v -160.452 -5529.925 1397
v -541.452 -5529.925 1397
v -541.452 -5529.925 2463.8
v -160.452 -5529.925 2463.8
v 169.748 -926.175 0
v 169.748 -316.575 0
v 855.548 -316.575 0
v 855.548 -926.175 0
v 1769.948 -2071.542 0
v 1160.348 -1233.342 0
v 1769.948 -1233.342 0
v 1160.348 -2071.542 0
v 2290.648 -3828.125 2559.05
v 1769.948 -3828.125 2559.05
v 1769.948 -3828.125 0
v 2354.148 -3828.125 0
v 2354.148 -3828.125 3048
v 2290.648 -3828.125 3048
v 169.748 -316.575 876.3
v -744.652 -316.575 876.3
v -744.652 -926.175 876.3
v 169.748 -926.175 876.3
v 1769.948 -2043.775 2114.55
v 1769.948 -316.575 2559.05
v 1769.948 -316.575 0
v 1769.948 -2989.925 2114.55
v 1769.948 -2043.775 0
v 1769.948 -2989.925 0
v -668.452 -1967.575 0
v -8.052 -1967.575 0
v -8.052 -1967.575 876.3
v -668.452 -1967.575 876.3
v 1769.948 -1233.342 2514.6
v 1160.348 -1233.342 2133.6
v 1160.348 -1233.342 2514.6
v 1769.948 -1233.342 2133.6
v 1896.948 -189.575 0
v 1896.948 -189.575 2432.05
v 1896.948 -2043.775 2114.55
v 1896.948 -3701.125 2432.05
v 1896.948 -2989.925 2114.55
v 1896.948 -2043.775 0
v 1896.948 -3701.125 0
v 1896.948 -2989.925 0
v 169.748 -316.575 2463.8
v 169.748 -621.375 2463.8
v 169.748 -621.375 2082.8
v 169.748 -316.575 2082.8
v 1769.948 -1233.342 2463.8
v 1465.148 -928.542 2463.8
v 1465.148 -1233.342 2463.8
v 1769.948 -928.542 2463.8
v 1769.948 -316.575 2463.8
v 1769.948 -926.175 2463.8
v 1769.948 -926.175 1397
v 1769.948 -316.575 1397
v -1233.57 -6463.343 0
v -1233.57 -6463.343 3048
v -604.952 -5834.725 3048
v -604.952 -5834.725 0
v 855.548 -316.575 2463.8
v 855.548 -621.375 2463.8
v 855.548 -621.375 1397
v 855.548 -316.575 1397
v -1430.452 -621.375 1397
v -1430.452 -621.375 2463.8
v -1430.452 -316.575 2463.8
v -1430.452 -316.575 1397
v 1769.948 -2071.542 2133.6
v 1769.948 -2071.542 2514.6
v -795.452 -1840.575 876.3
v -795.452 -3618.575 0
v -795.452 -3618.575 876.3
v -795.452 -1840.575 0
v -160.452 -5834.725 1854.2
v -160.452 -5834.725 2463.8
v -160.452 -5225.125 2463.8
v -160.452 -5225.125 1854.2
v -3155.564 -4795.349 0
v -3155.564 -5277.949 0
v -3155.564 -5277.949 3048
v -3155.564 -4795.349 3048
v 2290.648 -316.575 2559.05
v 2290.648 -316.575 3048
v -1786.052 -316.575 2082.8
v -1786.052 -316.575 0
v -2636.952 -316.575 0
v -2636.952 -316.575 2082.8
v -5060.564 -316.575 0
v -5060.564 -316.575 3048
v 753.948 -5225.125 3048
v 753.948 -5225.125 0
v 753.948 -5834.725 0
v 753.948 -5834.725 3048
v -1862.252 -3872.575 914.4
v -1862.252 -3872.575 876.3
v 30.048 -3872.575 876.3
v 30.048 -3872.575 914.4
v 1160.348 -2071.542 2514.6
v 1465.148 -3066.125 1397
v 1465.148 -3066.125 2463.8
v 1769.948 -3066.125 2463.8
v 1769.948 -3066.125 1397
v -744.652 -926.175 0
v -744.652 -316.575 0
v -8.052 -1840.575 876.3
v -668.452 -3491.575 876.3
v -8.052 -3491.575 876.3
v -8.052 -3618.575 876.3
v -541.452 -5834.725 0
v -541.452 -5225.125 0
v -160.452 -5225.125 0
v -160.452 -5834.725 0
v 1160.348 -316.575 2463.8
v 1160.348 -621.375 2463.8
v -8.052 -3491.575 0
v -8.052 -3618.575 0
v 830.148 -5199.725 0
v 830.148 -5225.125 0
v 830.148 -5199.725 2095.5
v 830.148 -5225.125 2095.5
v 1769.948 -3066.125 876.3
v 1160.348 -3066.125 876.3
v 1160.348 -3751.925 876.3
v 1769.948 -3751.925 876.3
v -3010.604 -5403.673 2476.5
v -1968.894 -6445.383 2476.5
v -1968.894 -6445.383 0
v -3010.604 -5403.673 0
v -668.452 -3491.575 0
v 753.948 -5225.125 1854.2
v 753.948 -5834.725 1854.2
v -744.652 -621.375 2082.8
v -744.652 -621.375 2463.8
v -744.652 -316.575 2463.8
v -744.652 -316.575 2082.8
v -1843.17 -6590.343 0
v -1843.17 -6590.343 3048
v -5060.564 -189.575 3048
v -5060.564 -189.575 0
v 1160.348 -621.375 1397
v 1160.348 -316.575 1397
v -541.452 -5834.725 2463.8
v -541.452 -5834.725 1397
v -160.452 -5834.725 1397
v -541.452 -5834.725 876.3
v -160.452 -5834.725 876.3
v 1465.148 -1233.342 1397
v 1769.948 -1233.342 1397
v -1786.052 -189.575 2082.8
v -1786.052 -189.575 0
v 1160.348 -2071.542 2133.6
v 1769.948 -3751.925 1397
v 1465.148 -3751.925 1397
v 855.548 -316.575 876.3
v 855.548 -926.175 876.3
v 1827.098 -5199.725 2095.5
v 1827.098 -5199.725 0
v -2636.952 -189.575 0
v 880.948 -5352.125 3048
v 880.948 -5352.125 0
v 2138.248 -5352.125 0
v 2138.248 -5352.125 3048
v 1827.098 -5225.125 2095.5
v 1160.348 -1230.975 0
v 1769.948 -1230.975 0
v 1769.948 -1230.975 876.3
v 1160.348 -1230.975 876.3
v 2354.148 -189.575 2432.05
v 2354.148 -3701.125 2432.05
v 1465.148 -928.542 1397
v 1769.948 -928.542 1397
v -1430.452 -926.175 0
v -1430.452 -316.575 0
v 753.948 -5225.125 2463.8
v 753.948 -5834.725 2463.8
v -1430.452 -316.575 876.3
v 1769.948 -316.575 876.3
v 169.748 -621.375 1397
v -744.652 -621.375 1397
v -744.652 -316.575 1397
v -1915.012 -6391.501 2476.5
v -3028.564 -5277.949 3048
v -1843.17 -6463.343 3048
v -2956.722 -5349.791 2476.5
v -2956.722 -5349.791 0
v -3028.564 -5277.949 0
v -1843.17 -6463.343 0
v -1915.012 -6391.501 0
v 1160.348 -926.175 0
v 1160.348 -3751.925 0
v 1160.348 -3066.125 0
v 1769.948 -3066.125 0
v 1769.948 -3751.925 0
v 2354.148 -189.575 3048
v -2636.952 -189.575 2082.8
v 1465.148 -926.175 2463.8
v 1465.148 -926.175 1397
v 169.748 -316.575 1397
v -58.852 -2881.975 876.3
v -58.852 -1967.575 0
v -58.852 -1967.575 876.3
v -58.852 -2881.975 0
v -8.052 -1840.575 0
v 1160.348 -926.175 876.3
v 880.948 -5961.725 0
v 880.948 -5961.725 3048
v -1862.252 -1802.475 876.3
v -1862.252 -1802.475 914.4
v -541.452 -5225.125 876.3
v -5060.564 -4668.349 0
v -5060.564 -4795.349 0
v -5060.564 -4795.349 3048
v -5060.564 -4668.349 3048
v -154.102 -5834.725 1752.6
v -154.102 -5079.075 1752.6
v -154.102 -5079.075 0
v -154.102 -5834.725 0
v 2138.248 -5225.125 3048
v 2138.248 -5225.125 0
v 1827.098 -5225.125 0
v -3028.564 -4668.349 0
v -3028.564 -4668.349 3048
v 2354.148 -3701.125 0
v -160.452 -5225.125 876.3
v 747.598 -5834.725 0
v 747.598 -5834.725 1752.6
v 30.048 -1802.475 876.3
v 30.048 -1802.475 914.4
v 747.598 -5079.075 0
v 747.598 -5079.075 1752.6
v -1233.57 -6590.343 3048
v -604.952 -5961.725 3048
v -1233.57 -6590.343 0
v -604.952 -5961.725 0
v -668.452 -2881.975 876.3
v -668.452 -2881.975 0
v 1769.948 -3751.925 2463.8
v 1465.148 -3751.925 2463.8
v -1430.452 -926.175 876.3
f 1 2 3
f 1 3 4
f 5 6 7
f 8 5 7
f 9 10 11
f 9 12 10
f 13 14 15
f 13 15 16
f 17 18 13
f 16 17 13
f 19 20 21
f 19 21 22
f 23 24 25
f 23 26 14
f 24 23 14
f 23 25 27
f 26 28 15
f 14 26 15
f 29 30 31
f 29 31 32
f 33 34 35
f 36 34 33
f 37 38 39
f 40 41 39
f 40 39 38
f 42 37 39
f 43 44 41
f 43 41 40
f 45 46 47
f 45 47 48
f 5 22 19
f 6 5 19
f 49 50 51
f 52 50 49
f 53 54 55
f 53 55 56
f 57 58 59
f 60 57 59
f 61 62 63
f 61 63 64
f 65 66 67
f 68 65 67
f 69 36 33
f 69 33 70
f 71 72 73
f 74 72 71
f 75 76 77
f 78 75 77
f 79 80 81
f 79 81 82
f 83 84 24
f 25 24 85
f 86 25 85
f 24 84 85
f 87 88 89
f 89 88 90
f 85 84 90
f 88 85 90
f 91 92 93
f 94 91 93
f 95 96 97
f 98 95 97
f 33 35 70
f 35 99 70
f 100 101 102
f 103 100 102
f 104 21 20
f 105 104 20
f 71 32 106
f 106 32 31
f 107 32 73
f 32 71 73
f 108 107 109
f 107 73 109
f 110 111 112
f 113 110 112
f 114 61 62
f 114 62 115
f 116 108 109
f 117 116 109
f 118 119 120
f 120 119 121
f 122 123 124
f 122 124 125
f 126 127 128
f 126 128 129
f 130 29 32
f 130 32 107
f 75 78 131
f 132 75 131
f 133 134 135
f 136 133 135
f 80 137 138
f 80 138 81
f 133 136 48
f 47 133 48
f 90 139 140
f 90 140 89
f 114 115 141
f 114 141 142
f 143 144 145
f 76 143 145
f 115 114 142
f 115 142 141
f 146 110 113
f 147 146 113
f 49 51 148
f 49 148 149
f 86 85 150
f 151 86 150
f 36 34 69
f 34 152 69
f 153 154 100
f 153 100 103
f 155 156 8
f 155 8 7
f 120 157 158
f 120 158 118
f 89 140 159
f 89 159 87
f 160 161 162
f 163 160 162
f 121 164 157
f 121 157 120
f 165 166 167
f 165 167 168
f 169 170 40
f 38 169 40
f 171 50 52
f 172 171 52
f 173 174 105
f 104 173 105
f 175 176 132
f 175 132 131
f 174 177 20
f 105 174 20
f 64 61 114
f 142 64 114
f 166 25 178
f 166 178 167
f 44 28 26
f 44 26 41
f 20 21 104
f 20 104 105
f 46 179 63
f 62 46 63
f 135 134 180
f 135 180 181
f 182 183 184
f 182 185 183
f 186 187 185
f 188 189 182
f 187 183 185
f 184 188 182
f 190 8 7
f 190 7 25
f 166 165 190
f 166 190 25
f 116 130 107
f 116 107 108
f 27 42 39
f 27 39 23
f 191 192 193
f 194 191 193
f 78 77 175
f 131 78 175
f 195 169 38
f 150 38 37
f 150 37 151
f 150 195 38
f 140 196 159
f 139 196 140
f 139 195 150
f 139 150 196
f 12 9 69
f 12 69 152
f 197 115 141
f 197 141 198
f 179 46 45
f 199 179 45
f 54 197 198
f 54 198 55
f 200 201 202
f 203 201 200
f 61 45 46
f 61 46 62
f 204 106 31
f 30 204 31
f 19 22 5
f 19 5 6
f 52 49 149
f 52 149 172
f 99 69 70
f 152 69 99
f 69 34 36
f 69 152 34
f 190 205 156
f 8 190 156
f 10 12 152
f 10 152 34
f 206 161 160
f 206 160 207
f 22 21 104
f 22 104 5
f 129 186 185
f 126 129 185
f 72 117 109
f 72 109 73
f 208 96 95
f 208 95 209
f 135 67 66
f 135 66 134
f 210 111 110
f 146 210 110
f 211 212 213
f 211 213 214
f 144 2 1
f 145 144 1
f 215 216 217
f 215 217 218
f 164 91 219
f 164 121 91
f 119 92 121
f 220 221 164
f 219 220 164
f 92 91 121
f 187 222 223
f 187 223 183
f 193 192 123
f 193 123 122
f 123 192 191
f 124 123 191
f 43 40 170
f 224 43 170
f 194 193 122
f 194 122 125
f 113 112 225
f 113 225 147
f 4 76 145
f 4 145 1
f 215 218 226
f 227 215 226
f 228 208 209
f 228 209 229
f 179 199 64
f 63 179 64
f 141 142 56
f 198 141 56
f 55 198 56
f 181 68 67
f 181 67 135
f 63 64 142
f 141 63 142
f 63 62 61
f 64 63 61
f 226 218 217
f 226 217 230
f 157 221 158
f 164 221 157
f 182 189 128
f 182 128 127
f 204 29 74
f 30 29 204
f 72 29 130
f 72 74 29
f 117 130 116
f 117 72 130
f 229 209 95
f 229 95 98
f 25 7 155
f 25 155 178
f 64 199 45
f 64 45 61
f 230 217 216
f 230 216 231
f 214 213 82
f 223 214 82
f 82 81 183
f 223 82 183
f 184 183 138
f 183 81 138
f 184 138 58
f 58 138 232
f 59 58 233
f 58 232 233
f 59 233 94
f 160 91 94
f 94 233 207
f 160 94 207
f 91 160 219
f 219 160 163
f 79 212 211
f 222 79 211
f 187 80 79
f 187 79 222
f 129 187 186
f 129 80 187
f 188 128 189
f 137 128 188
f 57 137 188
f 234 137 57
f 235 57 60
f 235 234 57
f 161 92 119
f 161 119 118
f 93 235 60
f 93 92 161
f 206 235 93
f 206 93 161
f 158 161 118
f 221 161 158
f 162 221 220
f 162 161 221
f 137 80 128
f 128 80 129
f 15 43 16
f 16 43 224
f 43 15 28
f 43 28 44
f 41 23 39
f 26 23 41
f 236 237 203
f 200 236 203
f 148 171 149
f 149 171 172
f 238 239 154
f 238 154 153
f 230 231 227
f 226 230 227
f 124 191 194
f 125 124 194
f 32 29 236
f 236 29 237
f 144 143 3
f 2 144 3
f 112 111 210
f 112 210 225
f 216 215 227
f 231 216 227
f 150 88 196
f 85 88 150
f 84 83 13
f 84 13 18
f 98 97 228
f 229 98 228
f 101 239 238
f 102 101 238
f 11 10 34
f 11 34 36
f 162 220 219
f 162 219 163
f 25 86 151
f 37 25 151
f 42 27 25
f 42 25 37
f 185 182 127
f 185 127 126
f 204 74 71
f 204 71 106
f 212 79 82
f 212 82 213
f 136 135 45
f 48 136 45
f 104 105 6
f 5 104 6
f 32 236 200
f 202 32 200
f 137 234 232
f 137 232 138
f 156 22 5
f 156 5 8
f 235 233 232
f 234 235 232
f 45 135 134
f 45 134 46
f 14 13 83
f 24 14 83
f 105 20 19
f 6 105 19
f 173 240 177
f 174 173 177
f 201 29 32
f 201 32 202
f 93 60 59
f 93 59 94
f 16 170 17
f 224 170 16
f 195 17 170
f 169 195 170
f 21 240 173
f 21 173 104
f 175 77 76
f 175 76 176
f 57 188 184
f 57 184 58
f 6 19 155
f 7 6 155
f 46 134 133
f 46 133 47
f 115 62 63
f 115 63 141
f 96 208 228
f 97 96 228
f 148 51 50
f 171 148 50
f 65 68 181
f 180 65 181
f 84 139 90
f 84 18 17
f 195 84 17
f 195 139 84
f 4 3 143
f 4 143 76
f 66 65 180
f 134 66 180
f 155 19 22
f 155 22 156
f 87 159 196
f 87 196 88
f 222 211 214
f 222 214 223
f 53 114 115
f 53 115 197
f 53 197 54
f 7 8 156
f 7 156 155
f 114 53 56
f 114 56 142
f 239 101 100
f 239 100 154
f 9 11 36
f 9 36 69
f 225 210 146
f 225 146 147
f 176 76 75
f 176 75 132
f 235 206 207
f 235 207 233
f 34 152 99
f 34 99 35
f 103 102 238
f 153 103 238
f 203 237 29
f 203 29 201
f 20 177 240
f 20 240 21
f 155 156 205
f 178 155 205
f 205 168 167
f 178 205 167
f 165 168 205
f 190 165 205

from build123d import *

# Parameters (mm, degrees)
F0_W      = 3556
F0_H      = 127
F1_DEPTH  = 3048
F3_DEPTH  = 3048
F4_W      = 127
F4_H      = 838.2
F5_DEPTH  = 3048
F6_W      = 1016
F6_H      = 127
F7_DEPTH  = 3048
F8_W      = 127
F8_H      = 482.6
F9_DEPTH  = 3048
F10_W     = 368.3
F10_H     = 127
F11_DEPTH = 3048
F12_W     = 996.95
F12_H     = 2095.5
F13_DEPTH = 25.4
F14_W     = 850.9
F14_H     = 965.2
F15_DEPTH = 127
F16_W     = 127
F16_H     = 965.2
F16_H_2   = 2082.8
F17_DEPTH = 2423.611736456
F18_W     = 1059.5979121052
F18_H     = 933.45
F19_DEPTH = 127
F21_W     = 457.2
F21_H     = 127
F22_DEPTH = 3048
F24_W     = 520.7
F24_H     = 3638.55
F25_DEPTH = 127
F26_W     = 3699.2286321938
F26_H     = 1626.0209083557
F27_DEPTH = 1270
F29_DEPTH = 127
F30_W     = 63.5
F30_H     = 615.95
F31_DEPTH = 3511.55
F32_W     = 1473.2
F32_H     = 2476.5
F33_DEPTH = 76.2
F34_W     = 609.6
F34_H     = 685.8
F35_DEPTH = 876.3
F37_DEPTH = 876.3
F39_DEPTH = 2133.6
F41_W     = 304.8
F41_H     = 685.8
F42_DEPTH = 1066.8
F43_W     = 304.8
F43_H     = 304.8
F44_DEPTH = 1066.8
F46_DEPTH = 1066.8
F47_W     = 304.8
F47_H     = 304.8
F48_DEPTH = 1066.8
F49_W     = 685.8
F49_H     = 609.6
F50_DEPTH = 876.3
F51_W     = 914.4
F51_H     = 609.6
F52_DEPTH = 876.3
F53_W     = 685.8
F53_H     = 609.6
F54_DEPTH = 876.3
F55_W     = 685.8
F55_H     = 304.8
F56_DEPTH = 1066.8
F57_W     = 914.4
F57_H     = 304.8
F58_DEPTH = 381
F59_W     = 685.8
F59_H     = 304.8
F60_DEPTH = 1066.8
F61_DEPTH = 381
F62_W     = 609.6
F62_H     = 914.4
F63_DEPTH = 876.3
F65_DEPTH = 876.3
F67_W     = 1892.3
F67_H     = 2070.1
F68_DEPTH = 38.1
F69_W     = 901.7
F69_H     = 755.65
F70_DEPTH = 1752.6
F71_W     = 381
F71_H     = 609.6
F72_DEPTH = 876.3
F73_W     = 914.4
F73_H     = 609.6
F74_DEPTH = 609.6
F75_W     = 381
F75_H     = 304.8
F76_DEPTH = 1066.8


with BuildPart() as f1:
    # F0 (on Top) → F1 (new body)
    with BuildSketch(Plane.XY):
        with Locations((-8.052283898, -253.0751817405)):
            Rectangle(F0_W, F0_H)
    extrude(amount=F1_DEPTH)

    # F2 (on face) → F3 (join, through all)
    with BuildSketch(Plane(origin=(0, 0, 0), x_dir=(1, 0, 0), z_dir=(0, 0, -1))):
        Polygon((1769.947716102, 2043.7751817405), (1769.947716102, 316.5751817405), (1769.947716102, 189.5751817405), (1896.947716102, 189.5751817405), (1896.947716102, 2043.7751817405), align=None)
    extrude(amount=-F3_DEPTH)

    # F14 (on face) → F15 (join, through all)
    with BuildSketch(Plane.XZ.offset(316.5751817405)):
        with Locations((-2211.502283898, 2565.4)):
            Rectangle(F14_W, F14_H)
    extrude(amount=-F15_DEPTH)

    # F16 (on face) → F17 (join, through all)
    with BuildSketch(Plane(origin=(-2636.952283898, 0, 0), x_dir=(0, -1, 0), z_dir=(-1, 0, 0))):
        with Locations((253.0751817405, 2565.4)):
            Rectangle(F16_W, F16_H)
        with Locations((253.0751817405, 1041.4)):
            Rectangle(F16_W, F16_H_2)
    extrude(amount=F17_DEPTH)


with BuildPart() as f5:
    # F4 (on face) → F5 (new body, through all)
    with BuildSketch(Plane(origin=(0, 0, 0), x_dir=(1, 0, 0), z_dir=(0, 0, -1))):
        with Locations((1833.447716102, 3409.0251817405)):
            Rectangle(F4_W, F4_H)
    extrude(amount=-F5_DEPTH)


with BuildPart() as f7:
    # F6 (on face) → F7 (new body, through all)
    with BuildSketch(Plane(origin=(0, 0, 0), x_dir=(1, 0, 0), z_dir=(0, 0, -1))):
        with Locations((1261.947716102, 5288.6251817405)):
            Rectangle(F6_W, F6_H)
    extrude(amount=-F7_DEPTH)

    # F8 (on face) → F9 (join, through all)
    with BuildSketch(Plane(origin=(0, 0, 0), x_dir=(1, 0, 0), z_dir=(0, 0, -1))):
        Polygon((-3028.564020354, 5277.9493022342), (-1843.1702123728, 6463.3431102153), (-1843.1702123728, 6590.3431102153), (-3155.564020354, 5277.9493022342), (-3155.564020354, 4795.3493022342), (-5060.564020354, 4795.3493022342), (-5060.564020354, 4668.3493022342), (-3028.564020354, 4668.3493022342), align=None)
        Polygon((-1233.5702123728, 6463.3431102153), (-604.952283898, 5834.7251817405), (-604.952283898, 5961.7251817405), (-1233.5702123728, 6590.3431102153), (-1843.1702123728, 6590.3431102153), (-1843.1702123728, 6463.3431102153), align=None)
        Polygon((-604.952283898, 5834.7251817405), (753.947716102, 5834.7251817405), (880.947716102, 5834.7251817405), (880.947716102, 5961.7251817405), (-604.952283898, 5961.7251817405), align=None)
        with Locations((817.447716102, 5593.4251817405)):
            Rectangle(F8_W, F8_H)
    extrude(amount=-F9_DEPTH)

    # F10 (on face) → F11 (join, through all)
    with BuildSketch(Plane(origin=(0, 0, 0), x_dir=(1, 0, 0), z_dir=(0, 0, -1))):
        with Locations((1954.097716102, 5288.6251817405)):
            Rectangle(F10_W, F10_H)
    extrude(amount=-F11_DEPTH)

    # F12 (on face) → F13 (join)
    with BuildSketch(Plane(origin=(0, -5225.1251817405, 0), x_dir=(-1, 0, 0), z_dir=(0, 1, 0))):
        with Locations((-1328.622716102, 1047.75)):
            Rectangle(F12_W, F12_H)
    extrude(amount=F13_DEPTH)

    # F32 (on face) → F33 (cut)
    with BuildSketch(Plane(origin=(-4153.2566612941, -4153.2566612941, 0), x_dir=(-0.7071067812, 0.7071067812, 0), z_dir=(0.7071067812, 0.7071067812, 0))):
        with Locations((-2428.7555863187, 1238.25)):
            Rectangle(F32_W, F32_H)
    extrude(amount=-F33_DEPTH, mode=Mode.SUBTRACT)


with BuildPart() as f19:
    # F18 (on face) → F19 (new body, through all)
    with BuildSketch(Plane(origin=(1769.947716102, 0, 0), x_dir=(0, -1, 0), z_dir=(-1, 0, 0))):
        with Locations((2573.5741377931, 2581.275)):
            Rectangle(F18_W, F18_H)
    extrude(amount=-F19_DEPTH)


with BuildPart() as f1_1:
    add(f1.part)

    # F20: union F19, F5
    add(f19.part)
    add(f5.part)

    # F21 (on face) → F22 (join, through all)
    with BuildSketch(Plane.XY.offset(3048)):
        with Locations((2125.547716102, -3764.6251817405)):
            Rectangle(F21_W, F21_H)
    extrude(amount=-F22_DEPTH)

    # F24 (on offset) → F25 (join)
    with BuildSketch(Plane(origin=(0, 0, 2559.05), x_dir=(1, 0, 0), z_dir=(0, 0, -1))):
        with Locations((2030.297716102, 2008.8501817405)):
            Rectangle(F24_W, F24_H)
    extrude(amount=F25_DEPTH)

    # F26 (on face) → F27 (cut)
    with BuildSketch(Plane.YZ.offset(2290.647716102)):
        with Locations((-2166.1894978374, 3372.0604541779)):
            Rectangle(F26_W, F26_H)
    extrude(amount=-F27_DEPTH, mode=Mode.SUBTRACT)

    # F28 (on face) → F29 (join, through all)
    with BuildSketch(Plane(origin=(0, -189.5751817405, 0), x_dir=(-1, 0, 0), z_dir=(0, 1, 0))):
        Polygon((-1896.947716102, 2559.05), (-1896.947716102, 3048), (-2354.147716102, 3048), (-2354.147716102, 2432.05), (-2290.647716102, 2432.05), (-2290.647716102, 2559.05), align=None)
    extrude(amount=-F29_DEPTH)

    # F30 (on face) → F31 (join, through all)
    with BuildSketch(Plane(origin=(0, -189.5751817405, 0), x_dir=(-1, 0, 0), z_dir=(0, 1, 0))):
        with Locations((-2322.397716102, 2740.025)):
            Rectangle(F30_W, F30_H)
    extrude(amount=-F31_DEPTH)


with BuildPart() as f35:
    # F34 (on face) → F35 (new body)
    with BuildSketch(Plane(origin=(0, 0, 0), x_dir=(1, 0, 0), z_dir=(0, 0, -1))):
        with Locations((1465.147716102, 3409.0251817405)):
            Rectangle(F34_W, F34_H)
    extrude(amount=-F35_DEPTH)


with BuildPart() as f37:
    # F36 (on face) → F37 (new body, through all)
    with BuildSketch(Plane(origin=(0, 0, 0), x_dir=(1, 0, 0), z_dir=(0, 0, -1))):
        Polygon((855.547716102, 926.1751817405), (855.547716102, 316.5751817405), (1769.947716102, 316.5751817405), (1769.947716102, 1230.9751817405), (1160.347716102, 1230.9751817405), (1160.347716102, 926.1751817405), align=None)
    extrude(amount=-F37_DEPTH)


with BuildPart() as f39:
    # F38 (on face) → F39 (new body)
    with BuildSketch(Plane(origin=(0, 0, 0), x_dir=(1, 0, 0), z_dir=(0, 0, -1))):
        Polygon((1160.347716102, 1233.342051506), (1769.947716102, 1233.342051506), (1769.947716102, 2043.7751817405), (1769.947716102, 2071.542051506), (1160.347716102, 2071.542051506), align=None)
    extrude(amount=-F39_DEPTH)


with BuildPart() as f42:
    # F41 (on offset) → F42 (new body)
    with BuildSketch(Plane(origin=(0, 0, 1397), x_dir=(1, 0, 0), z_dir=(0, 0, -1))):
        with Locations((1617.547716102, 3409.0251817405)):
            Rectangle(F41_W, F41_H)
    extrude(amount=-F42_DEPTH)


with BuildPart() as f44:
    # F43 (on face) → F44 (new body, through all)
    with BuildSketch(Plane.XY.offset(2463.8)):
        with Locations((1617.547716102, -1080.942051506)):
            Rectangle(F43_W, F43_H)
    extrude(amount=-F44_DEPTH)


with BuildPart() as f46:
    # F45 (on face) → F46 (new body, through all)
    with BuildSketch(Plane.XY.offset(2463.8)):
        Polygon((1769.947716102, -926.1751817405), (1769.947716102, -316.5751817405), (1160.347716102, -316.5751817405), (1160.347716102, -621.3751817405), (1465.147716102, -926.1751817405), align=None)
    extrude(amount=-F46_DEPTH)


with BuildPart() as f48:
    # F47 (on face) → F48 (new body, through all)
    with BuildSketch(Plane.XY.offset(2463.8)):
        with Locations((1007.947716102, -468.9751817405)):
            Rectangle(F47_W, F47_H)
    extrude(amount=-F48_DEPTH)


with BuildPart() as f50:
    # F49 (on face) → F50 (new body, through all)
    with BuildSketch(Plane.XY.offset(876.3)):
        with Locations((512.647716102, -621.3751817405)):
            Rectangle(F49_W, F49_H)
    extrude(amount=-F50_DEPTH)


with BuildPart() as f52:
    # F51 (on face) → F52 (new body, through all)
    with BuildSketch(Plane.XY.offset(876.3)):
        with Locations((-287.452283898, -621.3751817405)):
            Rectangle(F51_W, F51_H)
    extrude(amount=-F52_DEPTH)


with BuildPart() as f54:
    # F53 (on face) → F54 (new body, through all)
    with BuildSketch(Plane.XY.offset(876.3)):
        with Locations((-1087.552283898, -621.3751817405)):
            Rectangle(F53_W, F53_H)
    extrude(amount=-F54_DEPTH)


with BuildPart() as f56:
    # F55 (on face) → F56 (new body, through all)
    with BuildSketch(Plane.XY.offset(2463.8)):
        with Locations((512.647716102, -468.9751817405)):
            Rectangle(F55_W, F55_H)
    extrude(amount=-F56_DEPTH)


with BuildPart() as f58:
    # F57 (on face) → F58 (new body)
    with BuildSketch(Plane.XY.offset(2463.8)):
        with Locations((-287.452283898, -468.9751817405)):
            Rectangle(F57_W, F57_H)
    extrude(amount=-F58_DEPTH)


with BuildPart() as f60:
    # F59 (on face) → F60 (new body, through all)
    with BuildSketch(Plane.XY.offset(2463.8)):
        with Locations((-1087.552283898, -468.9751817405)):
            Rectangle(F59_W, F59_H)
    extrude(amount=-F60_DEPTH)


with BuildPart() as f61:
    # F61 (new): a face of the model
    f61_faces = [f39.part.faces().sort_by_distance(p)[0] for p in [
        (1465.147716102, -1652.442051506, 2133.6),
    ]]
    extrude(f61_faces, amount=F61_DEPTH)


with BuildPart() as f63:
    # F62 (on face) → F63 (new body)
    with BuildSketch(Plane(origin=(0, 0, 0), x_dir=(1, 0, 0), z_dir=(0, 0, -1))):
        with Locations((-363.652283898, 2424.7751817405)):
            Rectangle(F62_W, F62_H)
    extrude(amount=-F63_DEPTH)


with BuildPart() as f65:
    # F64 (on face) → F65 (new body, through all)
    with BuildSketch(Plane(origin=(0, 0, 0), x_dir=(1, 0, 0), z_dir=(0, 0, -1))):
        Polygon((-8.052283898, 1967.5751817405), (-58.852283898, 1967.5751817405), (-668.452283898, 1967.5751817405), (-668.452283898, 2881.9751817405), (-668.452283898, 3491.5751817405), (-8.052283898, 3491.5751817405), (-8.052283898, 3618.5751817405), (-795.452283898, 3618.5751817405), (-795.452283898, 1840.5751817405), (-8.052283898, 1840.5751817405), align=None)
    extrude(amount=-F65_DEPTH)


with BuildPart() as f68:
    # F67 (on offset) → F68 (new body)
    with BuildSketch(Plane.XY.offset(876.3)):
        with Locations((-916.102283898, -2837.5251817405)):
            Rectangle(F67_W, F67_H)
    extrude(amount=F68_DEPTH)


with BuildPart() as f70:
    # F69 (on face) → F70 (new body)
    with BuildSketch(Plane(origin=(0, 0, 0), x_dir=(1, 0, 0), z_dir=(0, 0, -1))):
        with Locations((296.747716102, 5456.9001817405)):
            Rectangle(F69_W, F69_H)
    extrude(amount=-F70_DEPTH)


with BuildPart() as f72:
    # F71 (on face) → F72 (new body)
    with BuildSketch(Plane(origin=(0, 0, 0), x_dir=(1, 0, 0), z_dir=(0, 0, -1))):
        with Locations((-350.952283898, 5529.9251817405)):
            Rectangle(F71_W, F71_H)
    extrude(amount=-F72_DEPTH)


with BuildPart() as f74:
    # F73 (on face) → F74 (new body)
    with BuildSketch(Plane.XY.offset(2463.8)):
        with Locations((296.747716102, -5529.9251817405)):
            Rectangle(F73_W, F73_H)
    extrude(amount=-F74_DEPTH)


with BuildPart() as f76:
    # F75 (on face) → F76 (new body, through all)
    with BuildSketch(Plane.XY.offset(2463.8)):
        with Locations((-350.952283898, -5682.3251817405)):
            Rectangle(F75_W, F75_H)
    extrude(amount=-F76_DEPTH)


solid = Compound([f7.part, f1_1.part, f35.part, f37.part, f39.part, f42.part, f44.part, f46.part, f48.part, f50.part, f52.part, f54.part, f56.part, f58.part, f60.part, f61.part, f63.part, f65.part, f68.part, f70.part, f72.part, f74.part, f76.part])
